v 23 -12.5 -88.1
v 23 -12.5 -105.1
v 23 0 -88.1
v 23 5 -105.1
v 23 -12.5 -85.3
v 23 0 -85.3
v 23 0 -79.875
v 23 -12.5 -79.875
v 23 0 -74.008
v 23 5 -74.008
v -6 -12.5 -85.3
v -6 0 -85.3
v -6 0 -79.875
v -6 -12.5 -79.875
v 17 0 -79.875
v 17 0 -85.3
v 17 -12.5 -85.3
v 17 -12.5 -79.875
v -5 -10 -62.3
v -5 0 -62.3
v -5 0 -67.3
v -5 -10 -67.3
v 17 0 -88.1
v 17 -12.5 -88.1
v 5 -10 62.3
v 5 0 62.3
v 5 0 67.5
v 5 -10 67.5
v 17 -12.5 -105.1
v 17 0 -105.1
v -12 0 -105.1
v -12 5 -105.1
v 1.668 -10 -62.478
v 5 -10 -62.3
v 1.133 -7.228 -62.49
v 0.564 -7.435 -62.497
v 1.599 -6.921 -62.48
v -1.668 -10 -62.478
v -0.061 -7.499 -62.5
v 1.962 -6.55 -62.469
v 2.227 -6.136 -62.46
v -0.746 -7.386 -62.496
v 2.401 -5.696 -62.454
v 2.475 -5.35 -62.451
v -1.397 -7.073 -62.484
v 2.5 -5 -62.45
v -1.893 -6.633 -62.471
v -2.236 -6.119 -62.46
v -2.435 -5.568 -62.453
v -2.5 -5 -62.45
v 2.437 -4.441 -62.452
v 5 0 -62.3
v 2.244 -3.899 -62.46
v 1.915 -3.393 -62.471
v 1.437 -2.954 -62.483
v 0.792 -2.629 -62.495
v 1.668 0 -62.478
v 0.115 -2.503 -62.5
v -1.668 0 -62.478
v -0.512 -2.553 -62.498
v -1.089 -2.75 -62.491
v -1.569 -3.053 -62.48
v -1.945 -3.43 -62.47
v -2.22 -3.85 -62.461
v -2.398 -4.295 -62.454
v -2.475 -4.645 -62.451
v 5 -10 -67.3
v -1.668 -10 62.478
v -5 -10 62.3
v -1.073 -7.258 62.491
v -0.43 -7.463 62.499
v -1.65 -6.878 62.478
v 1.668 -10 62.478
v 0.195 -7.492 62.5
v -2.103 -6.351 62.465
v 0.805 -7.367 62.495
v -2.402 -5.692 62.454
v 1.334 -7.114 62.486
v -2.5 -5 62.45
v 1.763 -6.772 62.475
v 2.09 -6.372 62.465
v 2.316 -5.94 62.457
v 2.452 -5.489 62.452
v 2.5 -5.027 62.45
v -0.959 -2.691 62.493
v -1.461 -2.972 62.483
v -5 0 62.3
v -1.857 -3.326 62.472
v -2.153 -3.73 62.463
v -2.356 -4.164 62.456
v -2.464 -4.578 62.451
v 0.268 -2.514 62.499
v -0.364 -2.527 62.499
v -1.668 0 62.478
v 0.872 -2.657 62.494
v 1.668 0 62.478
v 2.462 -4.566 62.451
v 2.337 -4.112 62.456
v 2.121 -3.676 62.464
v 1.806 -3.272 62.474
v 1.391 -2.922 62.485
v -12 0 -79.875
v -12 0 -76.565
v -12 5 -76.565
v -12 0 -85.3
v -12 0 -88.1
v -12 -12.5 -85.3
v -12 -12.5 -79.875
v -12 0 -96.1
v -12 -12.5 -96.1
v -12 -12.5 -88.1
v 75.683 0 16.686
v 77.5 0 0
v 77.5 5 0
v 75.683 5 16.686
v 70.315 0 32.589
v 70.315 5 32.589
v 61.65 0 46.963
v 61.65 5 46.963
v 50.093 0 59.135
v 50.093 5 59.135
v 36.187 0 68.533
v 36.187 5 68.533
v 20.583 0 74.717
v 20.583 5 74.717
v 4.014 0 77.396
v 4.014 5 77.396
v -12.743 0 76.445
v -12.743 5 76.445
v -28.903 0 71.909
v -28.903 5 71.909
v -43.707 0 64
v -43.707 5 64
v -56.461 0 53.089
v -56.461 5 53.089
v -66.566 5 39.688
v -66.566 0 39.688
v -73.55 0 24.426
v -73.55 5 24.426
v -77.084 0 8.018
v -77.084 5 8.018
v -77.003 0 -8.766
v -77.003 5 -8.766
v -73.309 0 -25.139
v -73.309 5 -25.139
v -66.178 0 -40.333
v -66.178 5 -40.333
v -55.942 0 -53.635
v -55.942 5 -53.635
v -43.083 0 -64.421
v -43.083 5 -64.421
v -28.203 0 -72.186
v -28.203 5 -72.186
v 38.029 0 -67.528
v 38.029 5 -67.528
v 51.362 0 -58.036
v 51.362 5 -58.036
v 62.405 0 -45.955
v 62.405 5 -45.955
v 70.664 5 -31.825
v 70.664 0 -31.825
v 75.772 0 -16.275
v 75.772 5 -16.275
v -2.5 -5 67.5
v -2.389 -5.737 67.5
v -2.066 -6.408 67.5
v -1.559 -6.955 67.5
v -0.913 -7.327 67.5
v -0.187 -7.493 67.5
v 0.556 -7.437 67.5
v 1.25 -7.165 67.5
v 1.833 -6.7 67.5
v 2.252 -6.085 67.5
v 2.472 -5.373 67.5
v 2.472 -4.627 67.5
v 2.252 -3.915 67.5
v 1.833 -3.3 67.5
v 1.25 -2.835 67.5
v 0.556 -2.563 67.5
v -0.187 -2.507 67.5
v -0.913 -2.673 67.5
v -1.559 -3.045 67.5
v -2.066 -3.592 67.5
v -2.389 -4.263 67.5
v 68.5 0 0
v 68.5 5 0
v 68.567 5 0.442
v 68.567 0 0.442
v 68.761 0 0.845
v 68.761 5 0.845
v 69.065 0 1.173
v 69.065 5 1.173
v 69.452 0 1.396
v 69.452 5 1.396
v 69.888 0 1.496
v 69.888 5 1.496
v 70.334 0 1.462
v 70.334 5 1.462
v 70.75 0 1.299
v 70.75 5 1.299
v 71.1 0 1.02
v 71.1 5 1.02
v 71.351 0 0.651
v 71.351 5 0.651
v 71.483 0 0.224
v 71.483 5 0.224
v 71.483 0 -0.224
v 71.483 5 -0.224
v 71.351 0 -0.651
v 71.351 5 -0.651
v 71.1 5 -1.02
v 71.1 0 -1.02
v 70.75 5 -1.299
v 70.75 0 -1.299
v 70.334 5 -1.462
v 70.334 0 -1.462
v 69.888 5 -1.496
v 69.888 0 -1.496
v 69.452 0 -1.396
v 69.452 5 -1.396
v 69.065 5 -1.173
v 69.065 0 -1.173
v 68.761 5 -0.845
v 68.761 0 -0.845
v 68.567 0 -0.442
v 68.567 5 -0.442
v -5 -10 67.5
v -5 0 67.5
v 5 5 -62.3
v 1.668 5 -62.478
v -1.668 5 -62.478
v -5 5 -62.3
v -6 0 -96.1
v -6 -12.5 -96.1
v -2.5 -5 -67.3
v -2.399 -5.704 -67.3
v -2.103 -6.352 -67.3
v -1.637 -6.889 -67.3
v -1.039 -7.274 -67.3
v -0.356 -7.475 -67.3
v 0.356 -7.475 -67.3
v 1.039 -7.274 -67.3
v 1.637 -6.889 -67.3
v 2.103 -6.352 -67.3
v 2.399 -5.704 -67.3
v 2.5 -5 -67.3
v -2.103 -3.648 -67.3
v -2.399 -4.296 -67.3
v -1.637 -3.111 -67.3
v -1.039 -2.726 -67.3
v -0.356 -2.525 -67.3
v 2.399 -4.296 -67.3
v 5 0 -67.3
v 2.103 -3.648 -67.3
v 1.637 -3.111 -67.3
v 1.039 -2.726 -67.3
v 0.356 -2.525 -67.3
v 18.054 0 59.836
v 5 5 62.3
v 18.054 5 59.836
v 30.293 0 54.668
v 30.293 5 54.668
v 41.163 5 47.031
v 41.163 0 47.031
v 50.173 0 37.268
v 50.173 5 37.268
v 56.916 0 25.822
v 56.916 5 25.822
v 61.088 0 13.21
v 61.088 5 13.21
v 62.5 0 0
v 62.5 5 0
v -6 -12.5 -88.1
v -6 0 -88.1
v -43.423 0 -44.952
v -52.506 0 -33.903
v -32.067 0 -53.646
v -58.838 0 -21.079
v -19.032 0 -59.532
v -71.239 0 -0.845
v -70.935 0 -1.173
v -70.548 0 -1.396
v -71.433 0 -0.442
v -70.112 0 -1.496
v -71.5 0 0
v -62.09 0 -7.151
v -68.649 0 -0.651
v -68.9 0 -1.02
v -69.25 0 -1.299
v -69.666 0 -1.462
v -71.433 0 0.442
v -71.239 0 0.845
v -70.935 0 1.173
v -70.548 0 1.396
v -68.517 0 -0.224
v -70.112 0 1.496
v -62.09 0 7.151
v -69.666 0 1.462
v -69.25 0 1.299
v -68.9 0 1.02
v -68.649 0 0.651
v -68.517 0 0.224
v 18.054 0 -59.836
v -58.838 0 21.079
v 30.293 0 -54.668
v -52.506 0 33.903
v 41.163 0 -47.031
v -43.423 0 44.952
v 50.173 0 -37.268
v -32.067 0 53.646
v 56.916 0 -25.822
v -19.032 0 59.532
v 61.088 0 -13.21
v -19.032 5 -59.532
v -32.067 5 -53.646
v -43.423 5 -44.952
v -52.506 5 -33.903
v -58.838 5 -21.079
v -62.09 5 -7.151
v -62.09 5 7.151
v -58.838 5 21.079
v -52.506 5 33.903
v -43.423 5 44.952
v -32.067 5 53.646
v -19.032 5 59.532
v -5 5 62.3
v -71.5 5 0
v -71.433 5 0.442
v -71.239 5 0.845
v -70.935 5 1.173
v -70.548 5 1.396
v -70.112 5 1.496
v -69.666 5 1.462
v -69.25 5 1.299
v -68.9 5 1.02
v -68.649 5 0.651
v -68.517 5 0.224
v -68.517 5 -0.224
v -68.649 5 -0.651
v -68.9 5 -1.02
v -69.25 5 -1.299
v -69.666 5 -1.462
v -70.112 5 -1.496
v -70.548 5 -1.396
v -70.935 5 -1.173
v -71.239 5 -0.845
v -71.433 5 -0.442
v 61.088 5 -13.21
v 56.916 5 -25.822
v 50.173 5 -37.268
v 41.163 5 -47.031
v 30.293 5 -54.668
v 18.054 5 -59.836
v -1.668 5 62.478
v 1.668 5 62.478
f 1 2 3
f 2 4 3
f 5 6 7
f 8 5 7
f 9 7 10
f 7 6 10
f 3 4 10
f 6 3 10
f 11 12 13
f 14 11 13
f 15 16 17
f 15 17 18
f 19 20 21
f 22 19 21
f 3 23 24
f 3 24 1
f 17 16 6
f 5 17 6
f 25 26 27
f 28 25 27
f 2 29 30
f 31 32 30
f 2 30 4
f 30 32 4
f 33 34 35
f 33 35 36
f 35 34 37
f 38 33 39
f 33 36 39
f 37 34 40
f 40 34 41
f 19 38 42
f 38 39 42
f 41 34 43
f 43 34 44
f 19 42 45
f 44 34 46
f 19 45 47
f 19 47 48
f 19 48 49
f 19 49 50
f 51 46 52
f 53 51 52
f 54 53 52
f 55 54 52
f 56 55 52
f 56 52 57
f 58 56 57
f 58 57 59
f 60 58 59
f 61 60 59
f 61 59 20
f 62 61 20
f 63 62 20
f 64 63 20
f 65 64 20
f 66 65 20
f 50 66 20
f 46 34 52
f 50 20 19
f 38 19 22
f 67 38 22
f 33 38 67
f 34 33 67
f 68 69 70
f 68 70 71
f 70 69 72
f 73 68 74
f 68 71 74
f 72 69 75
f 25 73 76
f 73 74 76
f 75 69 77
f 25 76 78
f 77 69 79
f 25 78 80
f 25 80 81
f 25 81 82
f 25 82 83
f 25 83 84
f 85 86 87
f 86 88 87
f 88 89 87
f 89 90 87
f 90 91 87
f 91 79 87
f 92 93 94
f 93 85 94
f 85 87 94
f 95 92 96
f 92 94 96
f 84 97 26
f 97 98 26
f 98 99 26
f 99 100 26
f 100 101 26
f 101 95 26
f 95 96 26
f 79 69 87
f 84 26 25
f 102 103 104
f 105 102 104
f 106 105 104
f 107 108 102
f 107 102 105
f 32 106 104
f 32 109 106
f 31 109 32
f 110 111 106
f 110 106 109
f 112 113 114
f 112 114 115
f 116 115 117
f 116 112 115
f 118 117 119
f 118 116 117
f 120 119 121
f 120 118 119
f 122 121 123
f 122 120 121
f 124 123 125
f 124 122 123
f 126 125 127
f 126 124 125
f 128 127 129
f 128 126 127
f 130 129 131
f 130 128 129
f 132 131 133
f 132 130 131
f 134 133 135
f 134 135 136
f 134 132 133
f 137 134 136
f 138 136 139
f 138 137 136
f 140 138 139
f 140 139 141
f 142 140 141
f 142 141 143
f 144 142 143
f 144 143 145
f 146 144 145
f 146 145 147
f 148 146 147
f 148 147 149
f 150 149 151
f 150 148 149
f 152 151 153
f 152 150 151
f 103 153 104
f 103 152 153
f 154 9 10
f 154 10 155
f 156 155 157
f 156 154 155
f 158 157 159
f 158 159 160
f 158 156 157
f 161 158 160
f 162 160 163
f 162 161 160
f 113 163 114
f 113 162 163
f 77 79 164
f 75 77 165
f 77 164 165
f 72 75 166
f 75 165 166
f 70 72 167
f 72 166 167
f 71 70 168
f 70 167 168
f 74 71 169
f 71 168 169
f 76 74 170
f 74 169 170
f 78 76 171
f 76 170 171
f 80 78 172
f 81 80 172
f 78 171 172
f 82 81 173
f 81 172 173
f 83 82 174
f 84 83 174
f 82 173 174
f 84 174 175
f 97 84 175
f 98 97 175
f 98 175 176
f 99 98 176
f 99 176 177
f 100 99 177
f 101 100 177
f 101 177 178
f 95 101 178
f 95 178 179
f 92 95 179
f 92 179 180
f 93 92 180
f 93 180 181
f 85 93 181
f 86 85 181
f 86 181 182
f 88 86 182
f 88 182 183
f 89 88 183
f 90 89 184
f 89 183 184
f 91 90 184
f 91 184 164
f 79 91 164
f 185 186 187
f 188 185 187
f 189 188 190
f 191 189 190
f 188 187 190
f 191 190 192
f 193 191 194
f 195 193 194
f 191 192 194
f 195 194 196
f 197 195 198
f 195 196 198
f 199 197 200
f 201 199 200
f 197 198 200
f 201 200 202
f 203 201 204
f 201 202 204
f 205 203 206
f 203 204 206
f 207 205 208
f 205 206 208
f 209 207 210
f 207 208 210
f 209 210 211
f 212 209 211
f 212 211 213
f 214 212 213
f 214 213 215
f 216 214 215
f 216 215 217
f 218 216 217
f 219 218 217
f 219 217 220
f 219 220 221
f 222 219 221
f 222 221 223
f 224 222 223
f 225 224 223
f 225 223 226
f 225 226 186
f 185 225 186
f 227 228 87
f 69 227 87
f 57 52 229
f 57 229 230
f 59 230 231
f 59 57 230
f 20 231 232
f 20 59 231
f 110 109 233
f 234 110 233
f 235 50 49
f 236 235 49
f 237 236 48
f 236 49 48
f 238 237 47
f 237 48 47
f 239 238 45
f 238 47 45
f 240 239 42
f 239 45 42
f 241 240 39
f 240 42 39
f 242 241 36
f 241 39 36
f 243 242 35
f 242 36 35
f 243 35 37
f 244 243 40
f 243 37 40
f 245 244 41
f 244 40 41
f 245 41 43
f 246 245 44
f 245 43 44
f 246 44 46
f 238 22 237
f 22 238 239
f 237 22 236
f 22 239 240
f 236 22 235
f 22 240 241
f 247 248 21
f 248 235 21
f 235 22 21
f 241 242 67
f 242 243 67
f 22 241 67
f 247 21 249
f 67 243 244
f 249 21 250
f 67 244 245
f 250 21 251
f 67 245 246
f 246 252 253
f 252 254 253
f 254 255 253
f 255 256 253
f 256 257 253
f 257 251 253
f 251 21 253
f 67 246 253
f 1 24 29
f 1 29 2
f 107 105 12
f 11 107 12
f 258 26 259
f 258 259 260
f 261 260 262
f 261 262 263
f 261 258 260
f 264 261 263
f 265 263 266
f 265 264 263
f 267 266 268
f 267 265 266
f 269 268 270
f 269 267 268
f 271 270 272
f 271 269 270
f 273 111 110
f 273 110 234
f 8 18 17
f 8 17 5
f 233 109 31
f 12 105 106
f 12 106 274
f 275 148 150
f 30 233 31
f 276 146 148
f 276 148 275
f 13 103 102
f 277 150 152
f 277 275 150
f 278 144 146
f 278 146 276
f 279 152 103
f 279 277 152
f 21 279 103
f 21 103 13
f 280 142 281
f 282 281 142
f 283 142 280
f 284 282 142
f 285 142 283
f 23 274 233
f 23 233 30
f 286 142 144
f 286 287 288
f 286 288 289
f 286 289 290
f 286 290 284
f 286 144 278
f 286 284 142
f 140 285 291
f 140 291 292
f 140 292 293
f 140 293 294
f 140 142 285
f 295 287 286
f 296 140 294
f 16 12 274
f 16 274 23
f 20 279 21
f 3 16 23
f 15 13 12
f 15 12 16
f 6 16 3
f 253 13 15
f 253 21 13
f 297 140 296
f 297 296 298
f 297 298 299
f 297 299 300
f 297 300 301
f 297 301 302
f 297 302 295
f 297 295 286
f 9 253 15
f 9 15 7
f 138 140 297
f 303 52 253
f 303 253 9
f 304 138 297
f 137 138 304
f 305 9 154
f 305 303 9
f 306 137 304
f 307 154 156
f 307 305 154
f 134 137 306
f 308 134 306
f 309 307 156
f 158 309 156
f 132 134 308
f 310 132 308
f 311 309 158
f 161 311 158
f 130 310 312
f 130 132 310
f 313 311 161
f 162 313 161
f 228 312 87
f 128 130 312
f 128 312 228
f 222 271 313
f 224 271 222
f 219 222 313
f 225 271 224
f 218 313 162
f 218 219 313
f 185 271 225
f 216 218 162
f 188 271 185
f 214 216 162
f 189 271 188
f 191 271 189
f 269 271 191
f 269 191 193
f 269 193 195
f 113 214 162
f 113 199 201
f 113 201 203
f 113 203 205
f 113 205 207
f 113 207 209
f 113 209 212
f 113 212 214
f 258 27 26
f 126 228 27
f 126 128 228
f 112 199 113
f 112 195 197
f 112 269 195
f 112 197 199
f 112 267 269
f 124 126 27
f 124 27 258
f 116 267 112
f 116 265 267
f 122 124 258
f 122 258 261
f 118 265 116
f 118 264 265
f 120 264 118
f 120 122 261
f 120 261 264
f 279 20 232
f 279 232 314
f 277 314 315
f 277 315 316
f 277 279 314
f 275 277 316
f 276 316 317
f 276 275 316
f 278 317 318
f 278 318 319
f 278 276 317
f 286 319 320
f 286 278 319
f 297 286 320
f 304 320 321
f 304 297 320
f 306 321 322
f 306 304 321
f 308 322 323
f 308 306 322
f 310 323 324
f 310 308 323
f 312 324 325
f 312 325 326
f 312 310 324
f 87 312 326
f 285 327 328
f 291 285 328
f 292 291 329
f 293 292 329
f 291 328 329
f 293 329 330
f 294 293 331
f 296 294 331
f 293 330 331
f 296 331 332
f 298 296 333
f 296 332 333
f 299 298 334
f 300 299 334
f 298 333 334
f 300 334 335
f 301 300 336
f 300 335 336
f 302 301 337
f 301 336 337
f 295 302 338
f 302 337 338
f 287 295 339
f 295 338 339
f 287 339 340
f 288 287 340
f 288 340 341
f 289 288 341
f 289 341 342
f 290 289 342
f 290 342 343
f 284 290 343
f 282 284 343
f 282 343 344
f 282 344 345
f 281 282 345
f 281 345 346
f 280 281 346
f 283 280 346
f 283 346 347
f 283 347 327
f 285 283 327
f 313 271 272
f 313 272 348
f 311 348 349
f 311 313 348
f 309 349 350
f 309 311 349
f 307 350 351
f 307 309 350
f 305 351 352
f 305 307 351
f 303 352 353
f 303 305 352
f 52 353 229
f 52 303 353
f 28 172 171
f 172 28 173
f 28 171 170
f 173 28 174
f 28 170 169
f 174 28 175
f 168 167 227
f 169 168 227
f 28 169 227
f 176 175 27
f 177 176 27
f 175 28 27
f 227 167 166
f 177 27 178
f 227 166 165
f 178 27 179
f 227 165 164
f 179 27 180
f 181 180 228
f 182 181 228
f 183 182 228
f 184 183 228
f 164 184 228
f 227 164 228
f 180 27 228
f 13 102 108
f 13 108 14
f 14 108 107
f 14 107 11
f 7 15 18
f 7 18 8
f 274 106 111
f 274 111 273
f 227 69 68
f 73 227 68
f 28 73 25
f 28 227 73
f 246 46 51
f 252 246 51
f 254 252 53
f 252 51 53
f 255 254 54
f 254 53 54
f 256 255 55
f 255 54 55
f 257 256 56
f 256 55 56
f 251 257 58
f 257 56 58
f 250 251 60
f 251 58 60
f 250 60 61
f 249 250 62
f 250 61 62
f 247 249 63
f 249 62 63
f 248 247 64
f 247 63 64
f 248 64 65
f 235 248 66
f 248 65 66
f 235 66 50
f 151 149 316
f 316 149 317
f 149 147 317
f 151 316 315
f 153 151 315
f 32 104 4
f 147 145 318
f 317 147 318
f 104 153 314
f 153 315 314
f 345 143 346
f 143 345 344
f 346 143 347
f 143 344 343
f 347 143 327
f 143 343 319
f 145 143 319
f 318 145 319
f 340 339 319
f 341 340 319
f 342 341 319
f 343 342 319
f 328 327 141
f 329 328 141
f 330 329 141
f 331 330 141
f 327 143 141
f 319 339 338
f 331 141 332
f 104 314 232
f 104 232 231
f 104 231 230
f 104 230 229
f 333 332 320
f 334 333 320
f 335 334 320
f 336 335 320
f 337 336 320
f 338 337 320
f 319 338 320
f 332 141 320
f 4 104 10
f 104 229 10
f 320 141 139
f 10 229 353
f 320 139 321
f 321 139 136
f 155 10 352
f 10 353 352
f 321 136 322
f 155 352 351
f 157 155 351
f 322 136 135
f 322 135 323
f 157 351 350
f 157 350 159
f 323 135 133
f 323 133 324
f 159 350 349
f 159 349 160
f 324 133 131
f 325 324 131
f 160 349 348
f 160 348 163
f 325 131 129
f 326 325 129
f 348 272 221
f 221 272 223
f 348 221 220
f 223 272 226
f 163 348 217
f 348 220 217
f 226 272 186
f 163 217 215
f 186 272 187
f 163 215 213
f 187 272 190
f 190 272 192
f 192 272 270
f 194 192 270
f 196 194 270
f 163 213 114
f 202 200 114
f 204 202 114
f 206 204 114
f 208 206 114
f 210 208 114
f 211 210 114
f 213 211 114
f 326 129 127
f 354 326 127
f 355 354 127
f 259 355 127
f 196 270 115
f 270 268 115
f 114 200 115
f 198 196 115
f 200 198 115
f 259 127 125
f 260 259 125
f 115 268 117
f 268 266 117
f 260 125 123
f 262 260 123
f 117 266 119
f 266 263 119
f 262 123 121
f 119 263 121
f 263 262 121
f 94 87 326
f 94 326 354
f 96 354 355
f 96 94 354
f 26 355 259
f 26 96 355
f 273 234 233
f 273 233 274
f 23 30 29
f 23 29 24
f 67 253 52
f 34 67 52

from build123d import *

# Parameters (mm, degrees)
F0_W     = 6
F0_H     = 5.4244026542
F0_H_2   = 17
F0_H_3   = 8
F0_W_2   = 10
F0_H_4   = 3.5826090725
F1_DEPTH = 5
F2_DEPTH = 12.5
F3_DEPTH = 10
F5_D     = 5
F5_DEPTH = 105.1006789719
F6_D     = 5
F7_D     = 3


with BuildPart() as f1:
    # F0 (on Front) → F1 (new body)
    with BuildSketch(Plane.XZ):
        with BuildLine():
            ThreePointArc((5, 62.2996789719), (45.9279326772, 42.3895623945), (62.5, 0))
            ThreePointArc((62.5, 0), (45.9279326772, -42.3895623945), (5, -62.2996789719))
            Line((5, -62.2996789719), (5, -63.7170698994))
            Line((5, -63.7170698994), (23, -63.7170698994))
            Line((23, -63.7170698994), (23, -74.008445464))
            ThreePointArc((23, -74.008445464), (62.40492769, -45.9551411705), (77.5, 0))
            ThreePointArc((77.5, 0), (-50.3798074629, 58.8907887534), (-12, -76.5653315803))
            Line((-12, -76.5653315803), (-12, -63.7170698994))
            Line((-12, -63.7170698994), (-5, -63.7170698994))
            Line((-5, -63.7170698994), (-5, -62.2996789719))
            ThreePointArc((-5, -62.2996789719), (-62.5, 0), (-5, 62.2996789719))
            Line((-5, 62.2996789719), (-5, 67.5))
            Line((-5, 67.5), (5, 67.5))
            Line((5, 67.5), (5, 62.2996789719))
        make_face()
        with BuildLine():
            Line((23, -79.8752763177), (23, -74.008445464))
            ThreePointArc((23, -74.008445464), (5.6466287865, -77.2940203596), (-12, -76.5653315803))
            Line((-12, -76.5653315803), (-12, -79.8752763177))
            Line((-12, -79.8752763177), (-6, -79.8752763177))
            Line((-6, -79.8752763177), (-6, -85.2996789719))
            Line((-6, -85.2996789719), (-12, -85.2996789719))
            Line((-12, -85.2996789719), (-12, -88.0996789719))
            Line((-12, -88.0996789719), (-6, -88.0996789719))
            Line((-6, -88.0996789719), (-6, -96.0996789719))
            Line((-6, -96.0996789719), (-12, -96.0996789719))
            Line((-12, -96.0996789719), (-12, -105.0996789719))
            Line((-12, -105.0996789719), (17, -105.0996789719))
            Line((17, -105.0996789719), (17, -88.0996789719))
            Line((17, -88.0996789719), (23, -88.0996789719))
            Line((23, -88.0996789719), (23, -85.2996789719))
            Line((23, -85.2996789719), (17, -85.2996789719))
            Line((17, -85.2996789719), (17, -79.8752763177))
            Line((17, -79.8752763177), (23, -79.8752763177))
        make_face()
        with BuildLine():
            Line((23, -63.7170698994), (5, -63.7170698994))
            Line((5, -63.7170698994), (5, -67.2996789719))
            Line((5, -67.2996789719), (-5, -67.2996789719))
            Line((-5, -67.2996789719), (-5, -63.7170698994))
            Line((-5, -63.7170698994), (-12, -63.7170698994))
            Line((-12, -63.7170698994), (-12, -76.5653315803))
            ThreePointArc((-12, -76.5653315803), (5.6466287865, -77.2940203596), (23, -74.008445464))
            Line((23, -74.008445464), (23, -63.7170698994))
        make_face()
        with Locations((20, -82.5874776448)):
            Rectangle(F0_W, F0_H)
        with Locations((20, -96.5996789719)):
            Rectangle(F0_W, F0_H_2)
        with Locations((-9, -82.5874776448)):
            Rectangle(F0_W, F0_H)
        with Locations((-9, -92.0996789719)):
            Rectangle(F0_W, F0_H_3)
        with Locations((0, -65.5083744356)):
            Rectangle(F0_W_2, F0_H_4)
        with BuildLine():
            Line((5, -63.7170698994), (5, -62.2996789719))
            ThreePointArc((5, -62.2996789719), (0, -62.5), (-5, -62.2996789719))
            Line((-5, -62.2996789719), (-5, -63.7170698994))
            Line((-5, -63.7170698994), (5, -63.7170698994))
        make_face()
        with BuildLine():
            ThreePointArc((-5, 62.2996789719), (0, 62.5), (5, 62.2996789719))
            Line((5, 62.2996789719), (5, 67.5))
            Line((5, 67.5), (-5, 67.5))
            Line((-5, 67.5), (-5, 62.2996789719))
        make_face()
    extrude(amount=-F1_DEPTH)

    # F0 (on Front) → F2 (join)
    with BuildSketch(Plane.XZ):
        with Locations((20, -82.5874776448)):
            Rectangle(F0_W, F0_H)
        with Locations((20, -96.5996789719)):
            Rectangle(F0_W, F0_H_2)
        with Locations((-9, -92.0996789719)):
            Rectangle(F0_W, F0_H_3)
        with Locations((-9, -82.5874776448)):
            Rectangle(F0_W, F0_H)
    extrude(amount=F2_DEPTH)

    # F0 (on Front) → F3 (join)
    with BuildSketch(Plane.XZ):
        with BuildLine():
            ThreePointArc((-5, 62.2996789719), (0, 62.5), (5, 62.2996789719))
            Line((5, 62.2996789719), (5, 67.5))
            Line((5, 67.5), (-5, 67.5))
            Line((-5, 67.5), (-5, 62.2996789719))
        make_face()
        with BuildLine():
            Line((5, -63.7170698994), (5, -62.2996789719))
            ThreePointArc((5, -62.2996789719), (0, -62.5), (-5, -62.2996789719))
            Line((-5, -62.2996789719), (-5, -63.7170698994))
            Line((-5, -63.7170698994), (5, -63.7170698994))
        make_face()
        with Locations((0, -65.5083744356)):
            Rectangle(F0_W_2, F0_H_4)
    extrude(amount=F3_DEPTH)

    # F5 (through all, one way)
    with BuildSketch(Plane.XY):
        with Locations((0, -5)):
            Circle(F5_D / 2)
    extrude(amount=-F5_DEPTH, mode=Mode.SUBTRACT)

    # F6 (through all)
    with Locations(Plane(origin=(0, 0, 0), x_dir=(1, 0, 0), z_dir=(0, 0, -1))):
        with Locations((0, 5)):
            Hole(F6_D / 2)

    # F7 (through all)
    with Locations(Plane.XZ):
        with Locations((-70, 0), (70, 0)):
            Hole(F7_D / 2)


solid = f1.part
